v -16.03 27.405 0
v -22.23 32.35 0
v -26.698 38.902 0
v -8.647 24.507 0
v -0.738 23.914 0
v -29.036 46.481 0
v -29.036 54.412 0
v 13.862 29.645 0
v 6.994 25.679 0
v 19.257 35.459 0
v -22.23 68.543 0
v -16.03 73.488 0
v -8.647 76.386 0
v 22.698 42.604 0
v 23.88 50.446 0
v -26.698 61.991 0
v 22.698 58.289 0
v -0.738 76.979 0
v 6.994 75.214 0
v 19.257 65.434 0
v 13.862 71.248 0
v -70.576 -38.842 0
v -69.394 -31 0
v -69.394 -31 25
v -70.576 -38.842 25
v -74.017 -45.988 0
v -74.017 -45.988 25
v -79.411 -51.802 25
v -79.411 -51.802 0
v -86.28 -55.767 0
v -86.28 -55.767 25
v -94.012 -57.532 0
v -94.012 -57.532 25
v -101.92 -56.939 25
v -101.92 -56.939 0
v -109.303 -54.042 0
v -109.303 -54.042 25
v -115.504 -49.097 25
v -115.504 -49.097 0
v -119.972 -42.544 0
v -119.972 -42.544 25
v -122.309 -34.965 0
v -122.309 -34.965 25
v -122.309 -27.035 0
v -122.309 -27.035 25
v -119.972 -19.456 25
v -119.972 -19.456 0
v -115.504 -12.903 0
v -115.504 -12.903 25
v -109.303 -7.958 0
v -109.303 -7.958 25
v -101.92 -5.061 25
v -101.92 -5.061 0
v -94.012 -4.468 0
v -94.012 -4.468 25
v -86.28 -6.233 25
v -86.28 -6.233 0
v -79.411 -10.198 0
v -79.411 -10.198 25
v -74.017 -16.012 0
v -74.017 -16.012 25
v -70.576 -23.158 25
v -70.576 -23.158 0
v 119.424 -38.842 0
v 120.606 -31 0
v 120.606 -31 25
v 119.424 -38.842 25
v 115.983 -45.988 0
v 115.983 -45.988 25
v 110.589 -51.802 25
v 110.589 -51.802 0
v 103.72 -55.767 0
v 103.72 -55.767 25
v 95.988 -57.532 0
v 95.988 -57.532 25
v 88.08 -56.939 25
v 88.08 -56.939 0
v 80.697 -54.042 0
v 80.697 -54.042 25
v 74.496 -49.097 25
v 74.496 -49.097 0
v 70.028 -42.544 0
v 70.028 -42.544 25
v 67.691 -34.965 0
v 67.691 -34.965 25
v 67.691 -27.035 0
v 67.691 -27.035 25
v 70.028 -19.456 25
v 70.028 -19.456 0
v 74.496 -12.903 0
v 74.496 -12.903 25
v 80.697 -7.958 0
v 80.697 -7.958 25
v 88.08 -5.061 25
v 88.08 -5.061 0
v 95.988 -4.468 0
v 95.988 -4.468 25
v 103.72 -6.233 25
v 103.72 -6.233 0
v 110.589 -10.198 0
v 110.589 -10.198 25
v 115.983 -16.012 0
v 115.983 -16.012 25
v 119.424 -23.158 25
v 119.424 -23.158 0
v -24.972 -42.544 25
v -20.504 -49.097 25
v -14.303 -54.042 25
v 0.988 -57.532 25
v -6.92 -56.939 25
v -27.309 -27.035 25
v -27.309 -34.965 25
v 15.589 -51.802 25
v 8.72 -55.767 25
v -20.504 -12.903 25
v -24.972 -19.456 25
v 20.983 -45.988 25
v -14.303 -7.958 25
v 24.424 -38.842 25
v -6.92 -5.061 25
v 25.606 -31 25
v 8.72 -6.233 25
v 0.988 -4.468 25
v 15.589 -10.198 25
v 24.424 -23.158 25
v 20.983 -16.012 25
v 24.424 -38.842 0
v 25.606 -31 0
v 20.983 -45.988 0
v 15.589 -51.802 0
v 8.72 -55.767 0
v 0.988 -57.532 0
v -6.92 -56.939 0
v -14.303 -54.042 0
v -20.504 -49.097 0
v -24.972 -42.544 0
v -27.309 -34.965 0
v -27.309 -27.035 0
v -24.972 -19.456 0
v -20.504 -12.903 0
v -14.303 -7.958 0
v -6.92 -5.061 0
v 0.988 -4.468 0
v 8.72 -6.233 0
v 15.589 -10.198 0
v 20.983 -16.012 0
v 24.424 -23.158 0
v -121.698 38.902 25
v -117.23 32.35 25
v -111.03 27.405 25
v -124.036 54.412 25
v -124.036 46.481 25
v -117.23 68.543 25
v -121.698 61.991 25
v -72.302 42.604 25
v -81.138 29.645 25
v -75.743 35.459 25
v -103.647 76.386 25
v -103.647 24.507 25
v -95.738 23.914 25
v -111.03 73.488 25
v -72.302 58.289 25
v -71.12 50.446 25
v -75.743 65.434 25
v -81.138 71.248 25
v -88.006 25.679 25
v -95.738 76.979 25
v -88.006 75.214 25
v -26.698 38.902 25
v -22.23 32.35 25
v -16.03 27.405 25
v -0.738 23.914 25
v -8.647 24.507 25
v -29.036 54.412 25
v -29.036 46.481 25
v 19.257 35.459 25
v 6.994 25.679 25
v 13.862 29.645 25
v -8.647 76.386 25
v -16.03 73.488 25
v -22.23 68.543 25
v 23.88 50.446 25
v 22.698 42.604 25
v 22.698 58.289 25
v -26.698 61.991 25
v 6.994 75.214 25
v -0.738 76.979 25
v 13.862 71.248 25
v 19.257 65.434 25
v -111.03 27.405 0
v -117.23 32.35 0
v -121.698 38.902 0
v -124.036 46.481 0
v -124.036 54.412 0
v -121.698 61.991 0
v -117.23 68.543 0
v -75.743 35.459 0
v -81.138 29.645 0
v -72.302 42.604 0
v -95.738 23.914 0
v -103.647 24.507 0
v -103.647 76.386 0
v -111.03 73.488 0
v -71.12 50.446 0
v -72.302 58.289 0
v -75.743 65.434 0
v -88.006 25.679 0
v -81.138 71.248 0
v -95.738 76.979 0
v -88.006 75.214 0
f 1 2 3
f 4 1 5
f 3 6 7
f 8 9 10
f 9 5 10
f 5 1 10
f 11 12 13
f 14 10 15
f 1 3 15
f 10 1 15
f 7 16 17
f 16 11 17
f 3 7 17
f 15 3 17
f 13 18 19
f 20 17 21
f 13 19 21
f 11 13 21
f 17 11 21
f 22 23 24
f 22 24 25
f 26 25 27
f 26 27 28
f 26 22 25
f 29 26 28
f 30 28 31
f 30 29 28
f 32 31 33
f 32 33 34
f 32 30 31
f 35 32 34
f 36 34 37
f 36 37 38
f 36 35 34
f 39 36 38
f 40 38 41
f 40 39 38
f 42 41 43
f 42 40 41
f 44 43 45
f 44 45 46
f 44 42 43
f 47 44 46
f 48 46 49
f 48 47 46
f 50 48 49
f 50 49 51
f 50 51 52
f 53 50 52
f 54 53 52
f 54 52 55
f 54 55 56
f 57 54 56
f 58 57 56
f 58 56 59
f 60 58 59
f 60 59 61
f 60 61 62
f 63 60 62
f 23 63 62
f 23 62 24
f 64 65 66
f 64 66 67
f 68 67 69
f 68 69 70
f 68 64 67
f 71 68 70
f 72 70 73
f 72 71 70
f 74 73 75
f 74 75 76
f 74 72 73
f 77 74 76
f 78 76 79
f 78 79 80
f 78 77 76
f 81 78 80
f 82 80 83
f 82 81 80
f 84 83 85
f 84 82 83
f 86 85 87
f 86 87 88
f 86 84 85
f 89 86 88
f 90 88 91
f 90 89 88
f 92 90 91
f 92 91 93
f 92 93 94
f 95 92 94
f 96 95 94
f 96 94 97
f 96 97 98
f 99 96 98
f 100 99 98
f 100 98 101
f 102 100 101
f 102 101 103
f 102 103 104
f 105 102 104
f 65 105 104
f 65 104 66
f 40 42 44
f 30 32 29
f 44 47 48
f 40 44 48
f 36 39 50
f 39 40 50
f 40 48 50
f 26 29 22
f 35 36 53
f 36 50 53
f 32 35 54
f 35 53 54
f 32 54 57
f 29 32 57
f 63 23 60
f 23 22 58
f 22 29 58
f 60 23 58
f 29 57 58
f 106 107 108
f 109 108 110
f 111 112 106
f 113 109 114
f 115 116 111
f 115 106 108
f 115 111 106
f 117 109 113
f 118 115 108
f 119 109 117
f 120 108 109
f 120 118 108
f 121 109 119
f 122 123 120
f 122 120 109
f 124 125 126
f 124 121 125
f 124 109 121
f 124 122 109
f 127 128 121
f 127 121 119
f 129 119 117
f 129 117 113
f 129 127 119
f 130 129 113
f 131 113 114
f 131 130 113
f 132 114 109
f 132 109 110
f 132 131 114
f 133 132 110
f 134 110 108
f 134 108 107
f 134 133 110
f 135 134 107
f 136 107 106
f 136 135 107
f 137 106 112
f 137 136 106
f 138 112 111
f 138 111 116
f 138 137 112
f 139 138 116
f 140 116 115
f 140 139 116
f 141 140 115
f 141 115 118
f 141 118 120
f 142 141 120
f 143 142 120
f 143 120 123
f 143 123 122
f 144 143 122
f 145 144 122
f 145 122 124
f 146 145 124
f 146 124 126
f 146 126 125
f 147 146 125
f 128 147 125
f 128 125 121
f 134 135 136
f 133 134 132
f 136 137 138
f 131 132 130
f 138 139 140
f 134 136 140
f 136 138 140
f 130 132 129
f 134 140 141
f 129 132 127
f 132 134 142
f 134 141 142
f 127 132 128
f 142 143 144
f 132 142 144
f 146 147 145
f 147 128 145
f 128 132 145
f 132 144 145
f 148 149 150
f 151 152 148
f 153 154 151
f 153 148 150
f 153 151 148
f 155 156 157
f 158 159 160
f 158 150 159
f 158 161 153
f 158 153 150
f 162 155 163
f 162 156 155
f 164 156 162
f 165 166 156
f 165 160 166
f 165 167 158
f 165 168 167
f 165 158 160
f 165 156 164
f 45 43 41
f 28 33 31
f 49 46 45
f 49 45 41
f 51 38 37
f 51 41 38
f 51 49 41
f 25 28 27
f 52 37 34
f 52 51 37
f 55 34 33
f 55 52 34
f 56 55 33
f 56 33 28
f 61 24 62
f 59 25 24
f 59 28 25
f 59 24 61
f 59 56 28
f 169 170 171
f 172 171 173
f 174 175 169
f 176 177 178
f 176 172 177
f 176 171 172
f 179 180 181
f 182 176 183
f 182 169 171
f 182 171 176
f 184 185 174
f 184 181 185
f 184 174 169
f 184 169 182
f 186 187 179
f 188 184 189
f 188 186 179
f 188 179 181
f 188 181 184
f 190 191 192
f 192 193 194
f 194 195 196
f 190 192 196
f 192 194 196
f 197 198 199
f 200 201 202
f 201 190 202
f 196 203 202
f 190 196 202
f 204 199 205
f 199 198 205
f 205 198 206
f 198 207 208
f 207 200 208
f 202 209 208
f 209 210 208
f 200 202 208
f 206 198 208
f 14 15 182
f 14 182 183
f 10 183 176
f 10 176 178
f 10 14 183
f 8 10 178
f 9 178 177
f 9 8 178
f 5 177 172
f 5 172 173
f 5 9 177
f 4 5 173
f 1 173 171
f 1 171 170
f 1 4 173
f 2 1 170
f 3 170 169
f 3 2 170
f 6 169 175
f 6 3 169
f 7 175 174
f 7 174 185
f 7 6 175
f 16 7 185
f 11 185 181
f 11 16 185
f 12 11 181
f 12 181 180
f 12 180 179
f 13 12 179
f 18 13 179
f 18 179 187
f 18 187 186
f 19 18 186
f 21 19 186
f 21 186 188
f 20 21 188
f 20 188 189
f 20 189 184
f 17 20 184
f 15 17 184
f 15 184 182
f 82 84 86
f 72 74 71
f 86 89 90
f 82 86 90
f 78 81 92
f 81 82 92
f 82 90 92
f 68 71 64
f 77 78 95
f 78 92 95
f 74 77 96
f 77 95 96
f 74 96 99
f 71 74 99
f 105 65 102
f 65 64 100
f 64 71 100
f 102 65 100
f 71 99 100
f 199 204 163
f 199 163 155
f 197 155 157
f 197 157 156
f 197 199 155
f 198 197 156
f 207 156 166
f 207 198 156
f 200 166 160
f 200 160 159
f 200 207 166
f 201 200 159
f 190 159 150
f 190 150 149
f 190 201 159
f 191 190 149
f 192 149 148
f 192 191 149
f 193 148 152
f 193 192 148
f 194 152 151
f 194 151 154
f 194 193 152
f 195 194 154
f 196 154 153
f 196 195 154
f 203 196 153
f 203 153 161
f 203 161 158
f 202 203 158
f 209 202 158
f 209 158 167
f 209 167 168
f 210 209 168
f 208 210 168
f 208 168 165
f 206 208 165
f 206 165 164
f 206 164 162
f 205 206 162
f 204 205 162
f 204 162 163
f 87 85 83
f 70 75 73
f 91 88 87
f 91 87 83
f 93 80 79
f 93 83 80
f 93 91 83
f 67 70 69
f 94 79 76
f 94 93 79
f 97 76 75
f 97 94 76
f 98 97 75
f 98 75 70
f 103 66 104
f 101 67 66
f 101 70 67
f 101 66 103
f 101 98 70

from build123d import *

# Parameters (mm, degrees)
F0_W       = 300
F0_H       = 160
F1_DEPTH   = 25
F2_W       = 300
F2_H       = 160
F2_R       = 26.6064560027
F1_FACE1_W = 300
F1_FACE1_H = 160
F3_DEPTH   = 25.001


with BuildPart() as f1:
    # F0 (on Top) → F1 (new body)
    with BuildSketch(Plane.XY):
        with Locations((3.7808977067, 9.5366072031)):
            Rectangle(F0_W, F0_H)
    extrude(amount=F1_DEPTH)

    # F2 (on face) + F1_face1 (on face) → F3 (cut, through all)
    with BuildSketch(Plane(origin=(0, 0, 0), x_dir=(1, 0, 0), z_dir=(0, 0, -1))):
        with Locations((3.7808977067, -9.5366072031)):
            Rectangle(F2_W, F2_H)
        with Locations((-97.7264517546, -50.4464879632)):
            Circle(F2_R, mode=Mode.SUBTRACT)
        with Locations((-2.7264517546, -50.4464879632)):
            Circle(F2_R, mode=Mode.SUBTRACT)
        with Locations((92.2735482454, -50.4464879632)):
            Circle(F2_R, mode=Mode.SUBTRACT)
        with Locations((-96, 31)):
            Circle(F2_R, mode=Mode.SUBTRACT)
        with Locations((-1, 31)):
            Circle(F2_R, mode=Mode.SUBTRACT)
        with Locations((94, 31)):
            Circle(F2_R, mode=Mode.SUBTRACT)
        with Locations((92.2735482454, -50.4464879632)):
            Circle(F2_R)
    with BuildSketch(Plane(origin=(3.7808977067, 9.5366072031, 25), x_dir=(1, 0, 0), z_dir=(0, 0, 1))):
        Rectangle(F1_FACE1_W, F1_FACE1_H)
    extrude(amount=-F3_DEPTH, dir=(0, 0, -1), mode=Mode.SUBTRACT)


solid = f1.part
